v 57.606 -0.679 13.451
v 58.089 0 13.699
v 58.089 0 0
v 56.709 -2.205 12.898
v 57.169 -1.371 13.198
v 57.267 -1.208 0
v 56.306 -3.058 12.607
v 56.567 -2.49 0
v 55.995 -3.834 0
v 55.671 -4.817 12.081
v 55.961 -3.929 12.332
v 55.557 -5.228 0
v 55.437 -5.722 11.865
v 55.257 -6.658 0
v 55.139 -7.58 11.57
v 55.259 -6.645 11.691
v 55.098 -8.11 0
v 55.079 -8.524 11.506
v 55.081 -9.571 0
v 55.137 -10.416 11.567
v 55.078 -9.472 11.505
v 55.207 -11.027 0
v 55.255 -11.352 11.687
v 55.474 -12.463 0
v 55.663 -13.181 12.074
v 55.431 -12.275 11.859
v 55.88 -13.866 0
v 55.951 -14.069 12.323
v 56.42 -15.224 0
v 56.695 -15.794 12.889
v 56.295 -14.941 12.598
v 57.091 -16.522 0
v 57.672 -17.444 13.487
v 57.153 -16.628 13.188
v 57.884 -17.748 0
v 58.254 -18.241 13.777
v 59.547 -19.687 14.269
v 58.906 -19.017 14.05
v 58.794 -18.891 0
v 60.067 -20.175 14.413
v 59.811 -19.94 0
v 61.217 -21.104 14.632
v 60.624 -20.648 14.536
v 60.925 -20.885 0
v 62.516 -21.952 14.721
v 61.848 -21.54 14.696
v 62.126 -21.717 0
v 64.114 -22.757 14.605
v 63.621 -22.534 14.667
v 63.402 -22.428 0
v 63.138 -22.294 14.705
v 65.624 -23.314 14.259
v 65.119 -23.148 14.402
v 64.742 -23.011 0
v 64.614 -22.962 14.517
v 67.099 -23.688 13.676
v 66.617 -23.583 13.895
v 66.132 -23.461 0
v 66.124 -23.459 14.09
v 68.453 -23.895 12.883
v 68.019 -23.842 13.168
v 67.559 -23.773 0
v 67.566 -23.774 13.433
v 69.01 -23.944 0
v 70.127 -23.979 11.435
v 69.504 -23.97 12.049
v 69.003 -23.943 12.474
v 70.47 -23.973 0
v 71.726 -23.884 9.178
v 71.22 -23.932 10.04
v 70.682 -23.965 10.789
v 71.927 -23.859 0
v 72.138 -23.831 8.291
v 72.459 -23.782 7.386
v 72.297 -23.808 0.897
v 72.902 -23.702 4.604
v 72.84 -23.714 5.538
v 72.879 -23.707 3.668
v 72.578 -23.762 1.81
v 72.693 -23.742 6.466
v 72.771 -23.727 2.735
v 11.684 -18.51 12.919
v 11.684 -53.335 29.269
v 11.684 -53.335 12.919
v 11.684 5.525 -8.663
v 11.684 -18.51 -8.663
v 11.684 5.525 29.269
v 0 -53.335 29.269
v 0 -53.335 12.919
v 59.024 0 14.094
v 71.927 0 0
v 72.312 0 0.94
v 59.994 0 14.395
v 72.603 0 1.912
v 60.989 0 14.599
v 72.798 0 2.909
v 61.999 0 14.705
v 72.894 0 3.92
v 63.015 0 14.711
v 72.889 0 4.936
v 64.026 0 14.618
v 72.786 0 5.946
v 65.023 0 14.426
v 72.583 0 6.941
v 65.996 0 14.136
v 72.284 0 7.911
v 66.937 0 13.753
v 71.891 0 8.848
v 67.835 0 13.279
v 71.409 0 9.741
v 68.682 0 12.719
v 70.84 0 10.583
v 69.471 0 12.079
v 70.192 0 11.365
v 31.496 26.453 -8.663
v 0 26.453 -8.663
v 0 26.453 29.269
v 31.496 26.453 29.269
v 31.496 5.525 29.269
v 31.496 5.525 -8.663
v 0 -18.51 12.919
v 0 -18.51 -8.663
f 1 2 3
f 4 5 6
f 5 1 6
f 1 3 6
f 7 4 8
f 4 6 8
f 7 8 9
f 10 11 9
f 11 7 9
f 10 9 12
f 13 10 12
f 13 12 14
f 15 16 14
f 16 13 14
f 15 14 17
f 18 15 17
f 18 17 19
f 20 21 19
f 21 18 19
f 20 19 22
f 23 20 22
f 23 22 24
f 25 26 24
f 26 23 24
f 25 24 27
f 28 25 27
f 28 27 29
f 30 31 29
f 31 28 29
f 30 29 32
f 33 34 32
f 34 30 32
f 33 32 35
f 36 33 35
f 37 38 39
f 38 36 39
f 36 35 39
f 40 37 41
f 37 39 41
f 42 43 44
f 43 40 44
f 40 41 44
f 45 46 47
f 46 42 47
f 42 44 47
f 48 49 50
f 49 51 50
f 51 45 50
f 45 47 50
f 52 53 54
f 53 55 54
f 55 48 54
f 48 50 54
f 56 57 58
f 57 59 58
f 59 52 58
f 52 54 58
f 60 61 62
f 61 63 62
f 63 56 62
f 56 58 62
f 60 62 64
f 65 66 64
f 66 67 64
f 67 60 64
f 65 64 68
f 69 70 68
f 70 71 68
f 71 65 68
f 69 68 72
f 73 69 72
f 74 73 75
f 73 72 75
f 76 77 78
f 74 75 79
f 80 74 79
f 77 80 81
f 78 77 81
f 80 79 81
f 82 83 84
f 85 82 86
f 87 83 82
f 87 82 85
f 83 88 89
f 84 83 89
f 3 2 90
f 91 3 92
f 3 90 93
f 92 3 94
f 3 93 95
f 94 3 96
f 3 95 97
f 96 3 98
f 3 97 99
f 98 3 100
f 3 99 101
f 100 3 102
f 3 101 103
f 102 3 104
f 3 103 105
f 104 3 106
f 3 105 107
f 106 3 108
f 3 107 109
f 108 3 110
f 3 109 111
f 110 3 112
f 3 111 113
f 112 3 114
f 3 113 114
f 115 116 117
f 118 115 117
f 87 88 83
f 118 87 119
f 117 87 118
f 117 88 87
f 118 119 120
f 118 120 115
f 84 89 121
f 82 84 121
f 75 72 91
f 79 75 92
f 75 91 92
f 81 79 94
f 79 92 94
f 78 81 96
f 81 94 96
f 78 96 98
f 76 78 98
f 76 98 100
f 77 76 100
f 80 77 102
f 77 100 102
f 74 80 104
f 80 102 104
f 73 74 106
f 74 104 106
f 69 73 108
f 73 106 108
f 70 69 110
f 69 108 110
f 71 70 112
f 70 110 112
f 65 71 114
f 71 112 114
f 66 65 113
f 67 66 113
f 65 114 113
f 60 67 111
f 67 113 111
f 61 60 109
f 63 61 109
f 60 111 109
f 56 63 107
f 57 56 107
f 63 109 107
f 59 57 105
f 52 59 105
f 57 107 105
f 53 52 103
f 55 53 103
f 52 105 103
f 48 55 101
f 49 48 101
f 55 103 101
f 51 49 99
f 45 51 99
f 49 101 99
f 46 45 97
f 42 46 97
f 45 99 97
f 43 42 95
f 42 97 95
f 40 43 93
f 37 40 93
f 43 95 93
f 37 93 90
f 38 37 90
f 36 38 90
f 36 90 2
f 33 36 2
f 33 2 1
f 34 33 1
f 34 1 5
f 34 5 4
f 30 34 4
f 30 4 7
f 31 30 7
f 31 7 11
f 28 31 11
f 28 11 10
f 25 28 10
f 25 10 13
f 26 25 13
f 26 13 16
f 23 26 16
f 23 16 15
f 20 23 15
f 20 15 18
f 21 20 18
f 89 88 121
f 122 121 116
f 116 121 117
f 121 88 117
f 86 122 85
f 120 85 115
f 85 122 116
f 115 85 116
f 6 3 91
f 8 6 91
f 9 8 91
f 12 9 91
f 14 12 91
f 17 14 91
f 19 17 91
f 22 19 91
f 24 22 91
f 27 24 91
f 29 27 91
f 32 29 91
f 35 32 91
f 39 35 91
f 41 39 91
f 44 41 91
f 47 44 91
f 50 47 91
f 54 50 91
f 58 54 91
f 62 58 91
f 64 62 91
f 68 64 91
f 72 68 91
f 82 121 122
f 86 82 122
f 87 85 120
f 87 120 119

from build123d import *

# Parameters (mm, degrees)
F1_DEPTH = 11.684
F0_W     = 20.927958
F0_H     = 37.93193
F2_DEPTH = 31.496
F3_R     = 14.966366
F4_DEPTH = 25.4
F5_R     = 6.323448
F5_R_2   = 10.334478
F6_DEPTH = 25.4


with BuildPart() as f1:
    # F0 (on Right) → F1 (new body)
    with BuildSketch(Plane.YZ):
        Polygon((5.524853, 29.268742), (-53.335037, 29.268742), (-53.335037, 12.918772), (-18.5096, 12.918772), (-18.5096, -8.663188), (5.524853, -8.663188), align=None)
    extrude(amount=F1_DEPTH)

    # F0 (on Right) → F2 (join)
    with BuildSketch(Plane.YZ):
        with Locations((15.988832, 10.302777)):
            Rectangle(F0_W, F0_H)
    extrude(amount=F2_DEPTH)


with BuildPart() as f4:
    # F3 (on Top) → F4 (new body)
    with BuildSketch(Plane.XY):
        with Locations((70.037141, -9.012804)):
            Circle(F3_R)
    extrude(amount=F4_DEPTH)

    # F5 (on Front) → F6 (intersect)
    with BuildSketch(Plane.XZ):
        with Locations((82.932055, 39.263789)):
            Circle(F5_R)
        with Locations((62.569559, 4.386574)):
            Circle(F5_R_2)
    extrude(amount=F6_DEPTH, mode=Mode.INTERSECT)


solid = Compound([f1.part, f4.part])
